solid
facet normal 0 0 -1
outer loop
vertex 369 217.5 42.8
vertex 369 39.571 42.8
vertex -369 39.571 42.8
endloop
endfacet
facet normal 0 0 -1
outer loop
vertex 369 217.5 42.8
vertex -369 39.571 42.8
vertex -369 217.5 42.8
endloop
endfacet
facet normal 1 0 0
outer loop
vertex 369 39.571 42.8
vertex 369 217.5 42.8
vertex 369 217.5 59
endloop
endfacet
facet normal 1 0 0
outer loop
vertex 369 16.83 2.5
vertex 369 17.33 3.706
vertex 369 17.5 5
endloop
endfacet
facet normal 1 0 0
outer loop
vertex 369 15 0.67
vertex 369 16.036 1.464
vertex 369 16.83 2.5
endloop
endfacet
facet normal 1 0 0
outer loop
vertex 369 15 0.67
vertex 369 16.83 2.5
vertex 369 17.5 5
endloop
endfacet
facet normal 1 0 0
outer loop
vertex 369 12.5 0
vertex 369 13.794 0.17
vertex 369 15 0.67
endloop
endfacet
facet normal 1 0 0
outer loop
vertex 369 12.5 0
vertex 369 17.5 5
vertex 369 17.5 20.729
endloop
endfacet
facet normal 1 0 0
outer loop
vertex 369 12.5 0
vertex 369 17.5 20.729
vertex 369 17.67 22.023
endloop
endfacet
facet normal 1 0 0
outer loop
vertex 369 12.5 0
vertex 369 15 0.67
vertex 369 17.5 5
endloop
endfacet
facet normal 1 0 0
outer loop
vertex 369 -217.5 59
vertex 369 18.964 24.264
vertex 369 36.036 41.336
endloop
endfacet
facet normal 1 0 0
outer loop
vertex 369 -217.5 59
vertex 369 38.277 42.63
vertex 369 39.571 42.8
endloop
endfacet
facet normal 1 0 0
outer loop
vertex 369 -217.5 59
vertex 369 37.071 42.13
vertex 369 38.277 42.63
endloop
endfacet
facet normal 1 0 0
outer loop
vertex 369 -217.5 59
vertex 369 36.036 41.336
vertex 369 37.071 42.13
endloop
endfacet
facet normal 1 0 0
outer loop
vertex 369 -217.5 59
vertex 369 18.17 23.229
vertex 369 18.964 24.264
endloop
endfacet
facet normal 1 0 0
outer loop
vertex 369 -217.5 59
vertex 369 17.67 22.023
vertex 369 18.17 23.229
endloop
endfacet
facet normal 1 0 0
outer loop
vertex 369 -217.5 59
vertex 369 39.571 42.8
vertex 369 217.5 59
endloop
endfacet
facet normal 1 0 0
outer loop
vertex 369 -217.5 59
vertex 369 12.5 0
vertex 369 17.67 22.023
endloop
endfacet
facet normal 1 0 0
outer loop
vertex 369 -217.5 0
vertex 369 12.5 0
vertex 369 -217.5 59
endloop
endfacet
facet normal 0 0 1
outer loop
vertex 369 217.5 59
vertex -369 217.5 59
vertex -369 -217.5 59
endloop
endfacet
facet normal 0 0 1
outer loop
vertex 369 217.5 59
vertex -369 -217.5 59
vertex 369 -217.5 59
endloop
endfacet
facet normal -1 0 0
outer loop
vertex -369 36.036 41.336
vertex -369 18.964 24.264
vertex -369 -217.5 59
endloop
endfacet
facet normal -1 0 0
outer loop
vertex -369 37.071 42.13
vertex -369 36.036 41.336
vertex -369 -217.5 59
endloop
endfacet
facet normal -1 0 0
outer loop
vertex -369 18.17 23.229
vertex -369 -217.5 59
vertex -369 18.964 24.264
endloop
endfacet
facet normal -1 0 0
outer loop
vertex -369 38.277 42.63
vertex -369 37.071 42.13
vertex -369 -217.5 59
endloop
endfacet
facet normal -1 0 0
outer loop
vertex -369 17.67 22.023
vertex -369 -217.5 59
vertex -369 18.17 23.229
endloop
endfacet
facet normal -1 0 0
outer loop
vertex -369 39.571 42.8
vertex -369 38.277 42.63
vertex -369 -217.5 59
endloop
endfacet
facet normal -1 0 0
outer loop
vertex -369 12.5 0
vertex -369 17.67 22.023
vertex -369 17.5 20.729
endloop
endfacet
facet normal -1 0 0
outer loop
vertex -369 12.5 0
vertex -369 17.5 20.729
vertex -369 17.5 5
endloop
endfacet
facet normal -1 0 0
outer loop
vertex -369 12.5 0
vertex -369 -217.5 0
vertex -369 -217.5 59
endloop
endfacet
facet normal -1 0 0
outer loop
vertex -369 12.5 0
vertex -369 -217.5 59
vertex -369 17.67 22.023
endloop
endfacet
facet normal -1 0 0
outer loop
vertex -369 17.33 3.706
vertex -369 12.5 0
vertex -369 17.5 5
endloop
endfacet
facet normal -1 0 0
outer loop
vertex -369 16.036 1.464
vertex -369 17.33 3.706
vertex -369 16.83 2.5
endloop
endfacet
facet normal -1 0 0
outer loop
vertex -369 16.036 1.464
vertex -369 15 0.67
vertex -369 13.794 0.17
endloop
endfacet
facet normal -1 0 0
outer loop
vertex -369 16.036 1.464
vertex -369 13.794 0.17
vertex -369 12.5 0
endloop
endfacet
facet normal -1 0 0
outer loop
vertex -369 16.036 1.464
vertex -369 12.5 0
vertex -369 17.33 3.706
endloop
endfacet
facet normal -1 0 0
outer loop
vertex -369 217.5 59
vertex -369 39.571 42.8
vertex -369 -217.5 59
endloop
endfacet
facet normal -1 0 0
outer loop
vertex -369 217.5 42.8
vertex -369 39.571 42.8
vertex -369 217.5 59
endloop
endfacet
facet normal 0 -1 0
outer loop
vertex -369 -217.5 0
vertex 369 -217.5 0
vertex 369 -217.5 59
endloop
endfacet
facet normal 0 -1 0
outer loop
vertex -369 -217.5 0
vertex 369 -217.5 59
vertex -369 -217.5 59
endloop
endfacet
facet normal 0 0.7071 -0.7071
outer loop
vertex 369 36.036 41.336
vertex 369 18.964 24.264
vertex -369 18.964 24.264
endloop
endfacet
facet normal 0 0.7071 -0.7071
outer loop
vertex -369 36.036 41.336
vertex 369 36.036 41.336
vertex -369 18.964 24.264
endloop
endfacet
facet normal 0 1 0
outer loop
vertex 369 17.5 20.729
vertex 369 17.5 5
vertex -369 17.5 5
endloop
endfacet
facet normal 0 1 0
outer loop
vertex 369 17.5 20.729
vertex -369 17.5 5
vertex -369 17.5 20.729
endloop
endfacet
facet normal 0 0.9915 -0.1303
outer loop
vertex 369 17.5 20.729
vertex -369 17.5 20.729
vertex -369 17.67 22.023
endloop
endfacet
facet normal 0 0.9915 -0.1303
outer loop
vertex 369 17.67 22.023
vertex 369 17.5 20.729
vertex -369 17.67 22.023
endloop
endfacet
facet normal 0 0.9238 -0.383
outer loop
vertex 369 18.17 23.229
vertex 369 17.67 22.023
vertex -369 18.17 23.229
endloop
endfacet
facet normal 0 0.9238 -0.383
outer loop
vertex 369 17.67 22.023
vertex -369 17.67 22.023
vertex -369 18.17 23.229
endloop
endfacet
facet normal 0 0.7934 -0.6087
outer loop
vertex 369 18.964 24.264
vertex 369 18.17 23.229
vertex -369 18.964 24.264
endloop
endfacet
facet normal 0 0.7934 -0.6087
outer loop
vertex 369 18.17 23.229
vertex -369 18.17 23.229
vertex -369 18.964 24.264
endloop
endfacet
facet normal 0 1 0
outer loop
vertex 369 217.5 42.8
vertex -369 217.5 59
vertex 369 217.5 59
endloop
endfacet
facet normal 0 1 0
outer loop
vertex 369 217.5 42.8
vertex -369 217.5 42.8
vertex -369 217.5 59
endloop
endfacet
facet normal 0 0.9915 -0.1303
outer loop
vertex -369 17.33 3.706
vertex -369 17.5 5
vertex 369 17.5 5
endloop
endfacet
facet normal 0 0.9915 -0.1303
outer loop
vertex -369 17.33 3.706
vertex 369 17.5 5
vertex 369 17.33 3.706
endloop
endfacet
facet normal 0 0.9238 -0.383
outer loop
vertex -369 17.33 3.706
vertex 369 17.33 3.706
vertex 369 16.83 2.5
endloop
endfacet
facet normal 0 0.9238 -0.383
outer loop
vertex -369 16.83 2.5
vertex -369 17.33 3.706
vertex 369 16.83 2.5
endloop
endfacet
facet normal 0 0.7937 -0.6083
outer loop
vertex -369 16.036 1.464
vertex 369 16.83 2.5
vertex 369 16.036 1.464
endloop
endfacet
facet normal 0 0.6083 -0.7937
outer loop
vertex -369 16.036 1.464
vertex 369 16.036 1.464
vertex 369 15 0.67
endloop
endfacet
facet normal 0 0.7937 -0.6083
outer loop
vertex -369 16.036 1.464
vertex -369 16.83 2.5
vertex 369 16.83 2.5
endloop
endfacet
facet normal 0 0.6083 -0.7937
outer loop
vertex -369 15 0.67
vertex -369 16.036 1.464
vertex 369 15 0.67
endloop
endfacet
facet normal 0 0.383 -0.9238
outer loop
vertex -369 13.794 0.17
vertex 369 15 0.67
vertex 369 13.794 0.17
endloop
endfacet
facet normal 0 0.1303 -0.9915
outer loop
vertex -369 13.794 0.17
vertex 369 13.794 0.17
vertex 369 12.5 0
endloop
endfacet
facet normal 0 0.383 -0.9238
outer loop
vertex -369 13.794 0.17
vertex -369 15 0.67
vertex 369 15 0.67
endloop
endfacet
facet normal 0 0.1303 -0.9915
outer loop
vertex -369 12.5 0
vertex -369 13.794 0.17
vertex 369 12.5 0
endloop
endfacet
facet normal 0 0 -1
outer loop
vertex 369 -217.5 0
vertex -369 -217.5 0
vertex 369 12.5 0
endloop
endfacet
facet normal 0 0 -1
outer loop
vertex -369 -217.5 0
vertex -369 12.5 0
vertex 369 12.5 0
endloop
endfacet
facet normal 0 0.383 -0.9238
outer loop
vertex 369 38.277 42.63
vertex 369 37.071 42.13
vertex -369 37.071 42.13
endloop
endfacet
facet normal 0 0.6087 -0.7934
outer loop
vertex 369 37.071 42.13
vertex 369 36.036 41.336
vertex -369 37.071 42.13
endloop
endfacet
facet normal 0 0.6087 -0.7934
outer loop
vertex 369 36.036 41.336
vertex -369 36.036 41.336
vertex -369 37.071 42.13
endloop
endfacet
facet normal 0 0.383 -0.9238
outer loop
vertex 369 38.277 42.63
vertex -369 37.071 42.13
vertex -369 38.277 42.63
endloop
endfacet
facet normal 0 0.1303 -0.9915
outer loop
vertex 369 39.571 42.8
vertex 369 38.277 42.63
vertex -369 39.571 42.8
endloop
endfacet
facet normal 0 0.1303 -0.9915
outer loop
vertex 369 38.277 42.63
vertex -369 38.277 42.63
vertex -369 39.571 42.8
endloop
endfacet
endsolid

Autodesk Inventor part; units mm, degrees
ref_plane "YZ Plane" through (0, 0, 0) normal (1, 0, 0) x (0, 1, 0)
ref_plane "XZ Plane" through (0, 0, 0) normal (0, 1, 0) x (-1, 0, 0)
ref_plane "XY Plane" through (0, 0, 0) normal (0, 0, 1) x (1, 0, 0)
sketch "スケッチ1" plane through (0, 0, 0) normal (0, 0, 1) x (1, 0, 0)
  line L0 (369, -217.5) -> (-369, -217.5)
  line L1 (-369, -217.5) -> (-369, 217.5)
  line L2 (-369, 217.5) -> (369, 217.5)
  line L3 (369, 217.5) -> (369, -217.5)
  line L4 (369, -217.5) -> (-369, 217.5) construction
  line L5 (-369, -217.5) -> (369, 217.5) construction
  point P0 (0, 0)
  dimension "d0" = 738
  dimension "d1" = 435
extrude "押し出し1" add sketch "スケッチ1" along normal blind 59
sketch "スケッチ2" plane through (369, -217.5, 0) normal (1, 0, 0) x (0, 0, -1)
  line L0 (0, 435) -> (-59, 435) projected
  line L1 (-42.8, 435) -> (0, 435)
  line L2 (0, 435) -> (0, 235)
  line L3 (0, 235) -> (-42.8, 235)
  line L4 (-42.8, 235) -> (-42.8, 435)
  line L5 (-59, 0) -> (-59, 435) projected
  point P0 (0, 217.5)
  dimension "d4" = 16.2
  dimension "d5" = 200
extrude "押し出し2" cut sketch "スケッチ2" against normal through all
chamfer "面取り1" distance 20 angle 45 1 edges at (0, 17.5, 42.8)
fillet "フィレット1" radius 5 3 edges at (0, 37.5, 42.8) (0, 17.5, 22.8) (0, 17.5, 0)
properties part number "Display_A"
